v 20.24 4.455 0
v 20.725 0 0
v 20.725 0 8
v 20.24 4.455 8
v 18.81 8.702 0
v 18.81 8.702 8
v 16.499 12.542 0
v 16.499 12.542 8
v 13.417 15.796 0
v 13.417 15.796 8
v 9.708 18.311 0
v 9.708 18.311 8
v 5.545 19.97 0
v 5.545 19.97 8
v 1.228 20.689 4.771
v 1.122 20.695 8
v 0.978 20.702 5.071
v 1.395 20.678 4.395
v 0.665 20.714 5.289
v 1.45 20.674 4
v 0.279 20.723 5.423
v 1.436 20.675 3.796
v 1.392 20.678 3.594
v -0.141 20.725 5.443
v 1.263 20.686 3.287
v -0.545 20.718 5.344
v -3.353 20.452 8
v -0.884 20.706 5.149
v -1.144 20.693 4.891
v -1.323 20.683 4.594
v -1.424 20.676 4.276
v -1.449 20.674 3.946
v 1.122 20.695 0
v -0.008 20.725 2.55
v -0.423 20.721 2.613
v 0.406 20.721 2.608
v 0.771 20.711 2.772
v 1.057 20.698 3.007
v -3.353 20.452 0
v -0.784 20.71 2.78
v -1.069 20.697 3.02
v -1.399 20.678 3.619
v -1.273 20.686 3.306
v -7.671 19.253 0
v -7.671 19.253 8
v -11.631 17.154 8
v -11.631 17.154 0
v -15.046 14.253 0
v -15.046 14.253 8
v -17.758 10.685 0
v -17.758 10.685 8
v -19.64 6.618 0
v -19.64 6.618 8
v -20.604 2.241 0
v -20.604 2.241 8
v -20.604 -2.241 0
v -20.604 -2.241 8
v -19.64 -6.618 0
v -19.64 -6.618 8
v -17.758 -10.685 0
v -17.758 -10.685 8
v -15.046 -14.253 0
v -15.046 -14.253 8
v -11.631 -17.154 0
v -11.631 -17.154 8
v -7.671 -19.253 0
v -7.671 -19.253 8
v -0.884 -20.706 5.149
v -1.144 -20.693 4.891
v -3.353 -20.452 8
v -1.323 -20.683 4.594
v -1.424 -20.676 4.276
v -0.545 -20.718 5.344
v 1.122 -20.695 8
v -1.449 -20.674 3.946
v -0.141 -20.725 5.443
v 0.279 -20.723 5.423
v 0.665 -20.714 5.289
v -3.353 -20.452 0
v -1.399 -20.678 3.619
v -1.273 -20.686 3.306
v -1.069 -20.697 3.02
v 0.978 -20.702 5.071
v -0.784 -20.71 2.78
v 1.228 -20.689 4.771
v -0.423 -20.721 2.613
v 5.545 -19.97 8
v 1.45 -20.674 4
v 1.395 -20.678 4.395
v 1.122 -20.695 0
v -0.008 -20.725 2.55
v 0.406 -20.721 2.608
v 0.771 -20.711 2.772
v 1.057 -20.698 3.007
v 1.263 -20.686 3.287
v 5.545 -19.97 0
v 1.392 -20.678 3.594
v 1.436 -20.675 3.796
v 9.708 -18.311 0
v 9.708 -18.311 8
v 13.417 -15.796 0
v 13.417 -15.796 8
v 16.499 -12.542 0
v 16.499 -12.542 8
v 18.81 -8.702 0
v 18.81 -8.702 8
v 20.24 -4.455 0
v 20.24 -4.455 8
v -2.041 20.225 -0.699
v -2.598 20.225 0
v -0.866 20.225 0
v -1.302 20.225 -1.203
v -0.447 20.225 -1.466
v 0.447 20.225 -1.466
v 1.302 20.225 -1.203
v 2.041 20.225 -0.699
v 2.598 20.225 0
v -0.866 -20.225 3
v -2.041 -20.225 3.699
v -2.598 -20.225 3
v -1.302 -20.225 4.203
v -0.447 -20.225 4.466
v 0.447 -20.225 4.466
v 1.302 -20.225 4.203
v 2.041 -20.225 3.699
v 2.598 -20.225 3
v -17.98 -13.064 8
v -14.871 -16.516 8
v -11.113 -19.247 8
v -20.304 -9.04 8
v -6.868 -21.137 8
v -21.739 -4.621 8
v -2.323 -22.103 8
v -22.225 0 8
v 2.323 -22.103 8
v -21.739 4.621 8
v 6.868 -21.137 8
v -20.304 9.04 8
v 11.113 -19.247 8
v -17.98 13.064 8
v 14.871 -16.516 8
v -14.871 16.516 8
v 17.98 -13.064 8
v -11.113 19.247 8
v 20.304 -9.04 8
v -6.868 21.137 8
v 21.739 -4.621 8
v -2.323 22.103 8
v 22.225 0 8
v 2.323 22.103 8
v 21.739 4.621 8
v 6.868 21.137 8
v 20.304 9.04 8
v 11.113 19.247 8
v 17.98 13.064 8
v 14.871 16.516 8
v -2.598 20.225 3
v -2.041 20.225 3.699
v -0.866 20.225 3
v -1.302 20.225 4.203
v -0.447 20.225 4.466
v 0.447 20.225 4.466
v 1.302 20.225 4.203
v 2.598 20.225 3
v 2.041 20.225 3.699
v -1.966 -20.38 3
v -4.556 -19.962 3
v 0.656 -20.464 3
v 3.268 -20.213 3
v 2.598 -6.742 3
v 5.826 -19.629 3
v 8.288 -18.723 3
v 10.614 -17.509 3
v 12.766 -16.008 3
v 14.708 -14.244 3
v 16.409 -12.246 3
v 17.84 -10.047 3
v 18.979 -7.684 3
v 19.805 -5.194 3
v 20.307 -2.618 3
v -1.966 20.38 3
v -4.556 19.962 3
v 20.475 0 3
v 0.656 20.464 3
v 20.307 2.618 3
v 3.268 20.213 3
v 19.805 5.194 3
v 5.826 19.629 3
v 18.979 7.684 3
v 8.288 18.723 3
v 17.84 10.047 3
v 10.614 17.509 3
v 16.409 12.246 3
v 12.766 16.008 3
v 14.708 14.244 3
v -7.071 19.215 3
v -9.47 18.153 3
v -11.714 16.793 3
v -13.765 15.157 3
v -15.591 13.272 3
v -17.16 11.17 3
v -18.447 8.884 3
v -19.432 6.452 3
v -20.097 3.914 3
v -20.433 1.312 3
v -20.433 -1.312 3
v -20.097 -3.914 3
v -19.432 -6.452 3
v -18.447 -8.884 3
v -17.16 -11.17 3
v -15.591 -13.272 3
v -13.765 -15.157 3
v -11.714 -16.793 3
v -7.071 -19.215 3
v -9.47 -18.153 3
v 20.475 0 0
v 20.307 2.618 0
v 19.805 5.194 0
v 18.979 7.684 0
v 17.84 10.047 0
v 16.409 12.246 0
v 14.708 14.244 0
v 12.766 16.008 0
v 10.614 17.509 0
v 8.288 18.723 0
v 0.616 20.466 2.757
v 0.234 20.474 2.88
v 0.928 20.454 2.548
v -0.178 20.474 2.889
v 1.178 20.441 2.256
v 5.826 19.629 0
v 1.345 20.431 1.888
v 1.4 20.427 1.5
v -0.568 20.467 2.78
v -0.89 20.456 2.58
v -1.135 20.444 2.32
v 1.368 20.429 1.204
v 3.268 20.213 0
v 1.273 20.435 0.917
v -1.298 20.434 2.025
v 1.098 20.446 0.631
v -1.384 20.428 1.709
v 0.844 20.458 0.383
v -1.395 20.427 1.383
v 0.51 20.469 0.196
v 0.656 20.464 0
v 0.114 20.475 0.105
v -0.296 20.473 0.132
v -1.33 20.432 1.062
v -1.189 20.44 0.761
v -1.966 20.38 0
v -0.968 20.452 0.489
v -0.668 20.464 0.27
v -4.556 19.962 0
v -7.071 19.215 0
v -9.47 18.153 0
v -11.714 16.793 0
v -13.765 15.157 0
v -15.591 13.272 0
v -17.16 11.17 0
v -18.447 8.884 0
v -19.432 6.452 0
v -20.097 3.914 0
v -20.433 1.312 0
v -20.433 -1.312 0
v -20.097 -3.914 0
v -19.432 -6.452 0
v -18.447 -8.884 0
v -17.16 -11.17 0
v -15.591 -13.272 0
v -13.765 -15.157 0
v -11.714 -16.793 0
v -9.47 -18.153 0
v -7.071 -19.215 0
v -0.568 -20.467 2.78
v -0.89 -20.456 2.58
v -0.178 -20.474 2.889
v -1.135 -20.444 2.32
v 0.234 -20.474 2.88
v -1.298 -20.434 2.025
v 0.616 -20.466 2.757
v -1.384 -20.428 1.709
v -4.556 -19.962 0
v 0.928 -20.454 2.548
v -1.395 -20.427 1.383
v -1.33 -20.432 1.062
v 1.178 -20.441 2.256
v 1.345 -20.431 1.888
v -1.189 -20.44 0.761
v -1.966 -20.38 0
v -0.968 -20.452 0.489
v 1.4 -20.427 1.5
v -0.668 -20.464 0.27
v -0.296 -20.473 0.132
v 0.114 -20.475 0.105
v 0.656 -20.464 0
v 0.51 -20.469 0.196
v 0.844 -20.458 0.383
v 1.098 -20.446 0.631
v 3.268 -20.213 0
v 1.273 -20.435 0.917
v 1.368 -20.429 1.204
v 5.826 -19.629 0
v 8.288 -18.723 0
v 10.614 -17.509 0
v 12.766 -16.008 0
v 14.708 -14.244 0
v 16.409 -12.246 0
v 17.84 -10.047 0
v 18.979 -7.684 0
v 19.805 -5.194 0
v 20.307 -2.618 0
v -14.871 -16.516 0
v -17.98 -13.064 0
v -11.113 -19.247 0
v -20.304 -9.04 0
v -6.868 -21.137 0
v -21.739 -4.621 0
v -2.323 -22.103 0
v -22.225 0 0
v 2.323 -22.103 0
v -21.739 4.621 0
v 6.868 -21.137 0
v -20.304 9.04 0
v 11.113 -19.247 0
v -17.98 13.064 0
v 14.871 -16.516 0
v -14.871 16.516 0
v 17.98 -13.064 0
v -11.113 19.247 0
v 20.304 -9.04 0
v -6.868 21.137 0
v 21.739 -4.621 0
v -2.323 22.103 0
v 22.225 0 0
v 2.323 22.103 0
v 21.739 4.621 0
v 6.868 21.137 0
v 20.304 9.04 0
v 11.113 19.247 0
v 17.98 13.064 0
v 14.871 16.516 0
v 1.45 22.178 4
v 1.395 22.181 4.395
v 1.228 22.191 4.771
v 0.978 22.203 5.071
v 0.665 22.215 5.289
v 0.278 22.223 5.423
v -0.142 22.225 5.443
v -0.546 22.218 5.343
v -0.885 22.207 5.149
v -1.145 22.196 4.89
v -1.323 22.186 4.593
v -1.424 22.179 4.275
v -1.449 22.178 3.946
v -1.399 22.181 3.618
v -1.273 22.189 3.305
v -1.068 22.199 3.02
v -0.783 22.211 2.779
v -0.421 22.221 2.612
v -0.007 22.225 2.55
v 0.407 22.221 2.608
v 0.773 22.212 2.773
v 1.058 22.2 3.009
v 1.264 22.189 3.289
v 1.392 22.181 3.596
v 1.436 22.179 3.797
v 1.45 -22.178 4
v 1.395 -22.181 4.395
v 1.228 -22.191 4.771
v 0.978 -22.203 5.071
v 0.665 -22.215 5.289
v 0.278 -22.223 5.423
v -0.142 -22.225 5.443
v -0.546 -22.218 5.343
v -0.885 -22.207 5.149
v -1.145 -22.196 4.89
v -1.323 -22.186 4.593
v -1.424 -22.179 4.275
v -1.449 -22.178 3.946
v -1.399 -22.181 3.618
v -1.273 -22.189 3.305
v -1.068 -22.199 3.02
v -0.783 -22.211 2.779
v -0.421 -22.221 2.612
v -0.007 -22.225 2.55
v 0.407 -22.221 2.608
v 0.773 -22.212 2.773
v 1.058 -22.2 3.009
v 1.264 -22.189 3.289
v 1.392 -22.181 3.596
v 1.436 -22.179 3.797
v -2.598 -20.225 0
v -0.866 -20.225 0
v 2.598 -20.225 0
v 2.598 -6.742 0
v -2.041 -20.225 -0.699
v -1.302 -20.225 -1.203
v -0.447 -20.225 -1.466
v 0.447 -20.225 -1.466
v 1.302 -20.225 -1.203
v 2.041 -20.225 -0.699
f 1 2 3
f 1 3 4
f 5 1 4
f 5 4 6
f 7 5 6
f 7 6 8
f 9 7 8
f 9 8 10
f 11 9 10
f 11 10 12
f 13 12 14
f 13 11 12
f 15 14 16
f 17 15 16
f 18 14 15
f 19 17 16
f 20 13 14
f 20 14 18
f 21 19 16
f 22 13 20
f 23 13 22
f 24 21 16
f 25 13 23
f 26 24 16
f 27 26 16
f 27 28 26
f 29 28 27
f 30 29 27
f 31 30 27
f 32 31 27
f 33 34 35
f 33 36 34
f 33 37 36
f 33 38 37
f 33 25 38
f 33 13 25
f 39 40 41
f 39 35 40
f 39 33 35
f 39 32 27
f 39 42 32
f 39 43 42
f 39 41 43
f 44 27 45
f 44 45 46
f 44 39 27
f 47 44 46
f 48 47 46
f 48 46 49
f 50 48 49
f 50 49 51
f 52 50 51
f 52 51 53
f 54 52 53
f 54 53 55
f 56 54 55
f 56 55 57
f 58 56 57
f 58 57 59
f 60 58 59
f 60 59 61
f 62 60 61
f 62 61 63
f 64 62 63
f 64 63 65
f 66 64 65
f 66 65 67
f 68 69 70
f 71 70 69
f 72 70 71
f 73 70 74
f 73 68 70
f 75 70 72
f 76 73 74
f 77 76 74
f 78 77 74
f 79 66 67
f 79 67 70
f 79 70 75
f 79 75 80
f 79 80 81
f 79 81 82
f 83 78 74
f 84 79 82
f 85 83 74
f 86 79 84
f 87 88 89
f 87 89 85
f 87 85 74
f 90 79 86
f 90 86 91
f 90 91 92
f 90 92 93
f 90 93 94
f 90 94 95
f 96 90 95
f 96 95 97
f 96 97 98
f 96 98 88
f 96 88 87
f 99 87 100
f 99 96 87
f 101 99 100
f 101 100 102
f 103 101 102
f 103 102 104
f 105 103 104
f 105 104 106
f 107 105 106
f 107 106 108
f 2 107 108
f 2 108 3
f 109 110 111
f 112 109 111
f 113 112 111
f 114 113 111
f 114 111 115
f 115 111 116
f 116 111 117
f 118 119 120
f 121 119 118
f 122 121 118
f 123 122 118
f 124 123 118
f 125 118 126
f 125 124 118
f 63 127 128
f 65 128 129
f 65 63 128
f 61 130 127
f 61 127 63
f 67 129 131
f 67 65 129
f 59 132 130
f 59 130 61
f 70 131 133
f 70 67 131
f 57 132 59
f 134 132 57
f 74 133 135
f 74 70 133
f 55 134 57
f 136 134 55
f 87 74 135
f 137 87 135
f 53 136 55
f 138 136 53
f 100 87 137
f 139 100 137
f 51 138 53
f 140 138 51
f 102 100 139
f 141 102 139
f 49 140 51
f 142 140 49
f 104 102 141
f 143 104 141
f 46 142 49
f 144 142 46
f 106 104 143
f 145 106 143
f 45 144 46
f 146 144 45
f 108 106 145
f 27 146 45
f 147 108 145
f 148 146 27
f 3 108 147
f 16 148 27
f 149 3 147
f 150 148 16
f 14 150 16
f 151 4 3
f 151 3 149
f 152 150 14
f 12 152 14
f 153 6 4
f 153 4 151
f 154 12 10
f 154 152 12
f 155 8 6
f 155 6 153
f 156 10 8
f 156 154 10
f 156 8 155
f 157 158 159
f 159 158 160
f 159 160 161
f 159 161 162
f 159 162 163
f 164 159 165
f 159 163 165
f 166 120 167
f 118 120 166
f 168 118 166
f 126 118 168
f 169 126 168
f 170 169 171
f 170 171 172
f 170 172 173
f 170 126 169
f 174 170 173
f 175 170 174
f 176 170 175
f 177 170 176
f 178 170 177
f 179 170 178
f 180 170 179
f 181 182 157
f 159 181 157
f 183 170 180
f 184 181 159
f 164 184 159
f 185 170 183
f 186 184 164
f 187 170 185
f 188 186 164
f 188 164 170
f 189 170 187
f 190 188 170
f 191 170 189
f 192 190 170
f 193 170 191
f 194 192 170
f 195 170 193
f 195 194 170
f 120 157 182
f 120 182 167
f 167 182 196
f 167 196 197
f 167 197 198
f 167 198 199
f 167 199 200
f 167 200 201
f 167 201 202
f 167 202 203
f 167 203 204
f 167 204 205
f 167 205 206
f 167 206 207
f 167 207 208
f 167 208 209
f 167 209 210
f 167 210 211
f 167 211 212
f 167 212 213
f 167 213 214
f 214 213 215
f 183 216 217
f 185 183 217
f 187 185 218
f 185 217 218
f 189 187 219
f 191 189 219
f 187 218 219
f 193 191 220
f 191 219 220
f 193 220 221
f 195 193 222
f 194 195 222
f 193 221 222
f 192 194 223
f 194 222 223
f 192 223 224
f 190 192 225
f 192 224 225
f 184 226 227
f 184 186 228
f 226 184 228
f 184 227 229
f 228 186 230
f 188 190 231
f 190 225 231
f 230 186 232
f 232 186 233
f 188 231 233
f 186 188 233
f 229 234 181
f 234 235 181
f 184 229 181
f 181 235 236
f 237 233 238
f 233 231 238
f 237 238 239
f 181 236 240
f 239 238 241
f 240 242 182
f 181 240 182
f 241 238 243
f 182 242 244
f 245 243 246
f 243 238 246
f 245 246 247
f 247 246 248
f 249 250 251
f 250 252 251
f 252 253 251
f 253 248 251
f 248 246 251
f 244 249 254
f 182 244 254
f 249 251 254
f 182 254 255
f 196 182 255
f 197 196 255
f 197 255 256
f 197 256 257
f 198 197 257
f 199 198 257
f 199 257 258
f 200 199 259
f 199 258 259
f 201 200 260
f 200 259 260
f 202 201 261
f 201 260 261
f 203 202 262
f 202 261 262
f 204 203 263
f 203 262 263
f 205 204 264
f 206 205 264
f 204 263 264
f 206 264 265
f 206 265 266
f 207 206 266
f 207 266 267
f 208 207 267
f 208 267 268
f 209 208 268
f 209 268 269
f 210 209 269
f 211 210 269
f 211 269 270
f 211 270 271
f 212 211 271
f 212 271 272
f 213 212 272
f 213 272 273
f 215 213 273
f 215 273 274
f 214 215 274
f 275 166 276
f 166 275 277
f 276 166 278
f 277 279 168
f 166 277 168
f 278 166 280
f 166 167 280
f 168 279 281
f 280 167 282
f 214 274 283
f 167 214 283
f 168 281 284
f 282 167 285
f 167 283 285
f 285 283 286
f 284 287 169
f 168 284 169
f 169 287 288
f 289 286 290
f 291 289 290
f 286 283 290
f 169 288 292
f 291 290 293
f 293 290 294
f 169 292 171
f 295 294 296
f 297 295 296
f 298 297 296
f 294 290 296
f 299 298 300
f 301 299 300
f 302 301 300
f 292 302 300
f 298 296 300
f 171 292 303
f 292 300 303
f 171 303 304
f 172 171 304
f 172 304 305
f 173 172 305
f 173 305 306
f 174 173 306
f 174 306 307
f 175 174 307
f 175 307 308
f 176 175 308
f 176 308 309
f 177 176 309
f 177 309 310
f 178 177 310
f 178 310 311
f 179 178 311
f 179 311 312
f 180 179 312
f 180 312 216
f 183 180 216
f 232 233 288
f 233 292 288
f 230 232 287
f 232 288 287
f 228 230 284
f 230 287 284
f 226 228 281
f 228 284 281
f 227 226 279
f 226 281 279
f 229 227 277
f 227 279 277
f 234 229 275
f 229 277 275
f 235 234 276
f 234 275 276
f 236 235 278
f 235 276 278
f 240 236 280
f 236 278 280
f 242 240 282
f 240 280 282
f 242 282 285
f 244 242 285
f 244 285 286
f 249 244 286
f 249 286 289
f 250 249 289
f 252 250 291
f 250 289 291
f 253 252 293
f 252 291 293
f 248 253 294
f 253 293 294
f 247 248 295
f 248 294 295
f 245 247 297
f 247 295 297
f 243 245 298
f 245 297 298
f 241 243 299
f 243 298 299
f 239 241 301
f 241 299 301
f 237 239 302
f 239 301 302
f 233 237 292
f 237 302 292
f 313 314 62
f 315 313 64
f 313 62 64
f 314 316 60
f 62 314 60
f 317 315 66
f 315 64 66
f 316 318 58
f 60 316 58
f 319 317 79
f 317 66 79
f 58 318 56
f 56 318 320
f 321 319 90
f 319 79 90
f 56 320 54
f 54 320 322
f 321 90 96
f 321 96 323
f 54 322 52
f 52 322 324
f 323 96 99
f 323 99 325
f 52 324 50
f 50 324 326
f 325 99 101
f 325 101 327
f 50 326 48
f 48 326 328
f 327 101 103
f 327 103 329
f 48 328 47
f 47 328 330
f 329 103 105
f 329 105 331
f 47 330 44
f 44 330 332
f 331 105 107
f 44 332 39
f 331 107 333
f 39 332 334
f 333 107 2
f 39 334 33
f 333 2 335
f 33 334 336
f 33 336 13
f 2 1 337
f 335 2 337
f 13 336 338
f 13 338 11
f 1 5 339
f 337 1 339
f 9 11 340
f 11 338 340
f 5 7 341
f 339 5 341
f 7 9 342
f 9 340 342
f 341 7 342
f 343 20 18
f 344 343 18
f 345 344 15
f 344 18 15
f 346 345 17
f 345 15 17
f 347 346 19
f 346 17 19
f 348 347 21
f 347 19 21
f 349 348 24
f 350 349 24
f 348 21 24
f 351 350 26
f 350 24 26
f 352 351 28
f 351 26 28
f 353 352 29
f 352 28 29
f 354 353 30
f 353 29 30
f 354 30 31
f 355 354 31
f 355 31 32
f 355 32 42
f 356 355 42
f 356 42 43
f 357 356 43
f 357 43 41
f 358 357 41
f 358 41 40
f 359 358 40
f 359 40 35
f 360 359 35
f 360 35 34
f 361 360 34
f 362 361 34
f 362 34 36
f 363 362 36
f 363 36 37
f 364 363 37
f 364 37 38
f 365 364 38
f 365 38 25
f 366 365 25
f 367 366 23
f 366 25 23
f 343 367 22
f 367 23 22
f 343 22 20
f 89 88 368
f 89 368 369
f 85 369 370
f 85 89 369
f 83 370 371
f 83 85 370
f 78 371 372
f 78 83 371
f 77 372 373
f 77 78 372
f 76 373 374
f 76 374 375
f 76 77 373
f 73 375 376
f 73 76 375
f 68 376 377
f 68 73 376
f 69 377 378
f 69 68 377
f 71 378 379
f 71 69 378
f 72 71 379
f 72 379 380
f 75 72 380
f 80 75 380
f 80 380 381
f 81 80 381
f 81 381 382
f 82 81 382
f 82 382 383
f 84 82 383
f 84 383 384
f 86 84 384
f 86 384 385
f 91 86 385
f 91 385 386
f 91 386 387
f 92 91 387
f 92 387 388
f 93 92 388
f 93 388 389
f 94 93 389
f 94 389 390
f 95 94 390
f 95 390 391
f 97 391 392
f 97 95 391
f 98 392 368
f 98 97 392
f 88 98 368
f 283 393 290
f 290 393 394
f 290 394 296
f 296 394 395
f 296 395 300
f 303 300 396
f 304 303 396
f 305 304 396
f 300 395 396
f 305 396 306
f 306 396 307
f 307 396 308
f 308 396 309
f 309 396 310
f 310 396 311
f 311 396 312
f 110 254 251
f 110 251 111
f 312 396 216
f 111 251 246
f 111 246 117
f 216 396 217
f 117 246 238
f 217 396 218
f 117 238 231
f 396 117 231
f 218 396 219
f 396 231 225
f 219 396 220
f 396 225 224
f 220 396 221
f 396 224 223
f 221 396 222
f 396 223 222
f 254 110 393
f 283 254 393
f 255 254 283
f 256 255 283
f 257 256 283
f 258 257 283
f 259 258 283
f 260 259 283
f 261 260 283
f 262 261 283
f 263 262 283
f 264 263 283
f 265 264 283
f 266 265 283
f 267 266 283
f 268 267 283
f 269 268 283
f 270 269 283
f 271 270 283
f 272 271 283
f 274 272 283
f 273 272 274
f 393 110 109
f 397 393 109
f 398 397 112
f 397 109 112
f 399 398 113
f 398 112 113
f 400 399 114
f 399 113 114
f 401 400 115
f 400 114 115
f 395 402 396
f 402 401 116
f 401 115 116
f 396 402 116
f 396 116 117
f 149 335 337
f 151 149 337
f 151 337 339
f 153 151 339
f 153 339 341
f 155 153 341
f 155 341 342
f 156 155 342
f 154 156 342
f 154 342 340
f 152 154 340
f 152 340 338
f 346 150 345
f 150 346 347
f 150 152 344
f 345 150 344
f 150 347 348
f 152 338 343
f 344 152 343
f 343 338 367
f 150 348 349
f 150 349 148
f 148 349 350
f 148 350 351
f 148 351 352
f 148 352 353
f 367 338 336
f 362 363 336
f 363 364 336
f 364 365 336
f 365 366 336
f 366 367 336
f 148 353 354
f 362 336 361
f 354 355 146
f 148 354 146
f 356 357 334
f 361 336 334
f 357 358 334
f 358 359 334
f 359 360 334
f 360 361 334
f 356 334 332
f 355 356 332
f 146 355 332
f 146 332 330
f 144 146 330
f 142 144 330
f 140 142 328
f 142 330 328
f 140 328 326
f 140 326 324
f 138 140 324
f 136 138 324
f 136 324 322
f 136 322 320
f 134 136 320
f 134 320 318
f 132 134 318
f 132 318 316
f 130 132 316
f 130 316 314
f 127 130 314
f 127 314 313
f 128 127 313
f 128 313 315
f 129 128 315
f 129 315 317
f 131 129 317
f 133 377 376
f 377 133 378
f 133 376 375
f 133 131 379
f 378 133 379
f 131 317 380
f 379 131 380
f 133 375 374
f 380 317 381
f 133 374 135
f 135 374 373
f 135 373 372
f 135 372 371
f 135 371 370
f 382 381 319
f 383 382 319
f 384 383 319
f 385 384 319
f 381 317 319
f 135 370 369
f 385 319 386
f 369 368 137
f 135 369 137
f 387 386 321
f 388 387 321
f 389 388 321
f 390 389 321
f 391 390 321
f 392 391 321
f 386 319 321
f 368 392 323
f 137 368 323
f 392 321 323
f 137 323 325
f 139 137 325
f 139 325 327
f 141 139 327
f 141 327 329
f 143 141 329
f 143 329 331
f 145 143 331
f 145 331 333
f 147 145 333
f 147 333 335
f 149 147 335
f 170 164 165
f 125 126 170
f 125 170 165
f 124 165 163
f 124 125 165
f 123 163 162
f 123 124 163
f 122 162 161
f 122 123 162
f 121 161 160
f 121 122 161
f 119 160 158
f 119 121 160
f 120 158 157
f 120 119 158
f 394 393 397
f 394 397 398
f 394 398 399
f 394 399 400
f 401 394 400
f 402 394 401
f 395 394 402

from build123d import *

# Parameters (mm, degrees)
F0_R          = 22.225
F0_R_2        = 20.725
F1_DEPTH      = 8
F0_R_3        = 20.475
F2_DEPTH      = 3
F3_R          = 3
F4_DEPTH      = 20.225
F4_DEPTH_BACK = 20.225
F5_R          = 1.45
F6_DEPTH      = 22.226
F6_DEPTH_BACK = 22.226
F7_R          = 1.4
F8_DEPTH      = 22.2260001181
F8_DEPTH_BACK = 22.2260001181


with BuildPart() as f1:
    # F0 (on Top) → F1 (new body)
    with BuildSketch(Plane.XY):
        Circle(F0_R)
        Circle(F0_R_2, mode=Mode.SUBTRACT)
    extrude(amount=F1_DEPTH)

    # F5 (on Front) → F6 (cut, two sides)
    with BuildSketch(Plane.XZ) as f6_sk:
        with Locations((0, 4)):
            Circle(F5_R)
    extrude(amount=-F6_DEPTH, mode=Mode.SUBTRACT)
    extrude(f6_sk.sketch, amount=F6_DEPTH_BACK, mode=Mode.SUBTRACT)


with BuildPart() as f2:
    # F0 (on Top) → F2 (new body)
    with BuildSketch(Plane.XY):
        Circle(F0_R_3)
    extrude(amount=F2_DEPTH)

    # F3 (on Front) → F4 (join, two sides)
    with BuildSketch(Plane.XZ) as f4_sk:
        with Locations((0, 1.5)):
            Circle(F3_R)
    extrude(amount=F4_DEPTH)
    extrude(f4_sk.sketch, amount=-F4_DEPTH_BACK)

    # F7 (on Front) → F8 (cut, two sides)
    with BuildSketch(Plane.XZ) as f8_sk:
        with Locations((0, 1.5)):
            Circle(F7_R)
    extrude(amount=-F8_DEPTH, mode=Mode.SUBTRACT)
    extrude(f8_sk.sketch, amount=F8_DEPTH_BACK, mode=Mode.SUBTRACT)


solid = Compound([f1.part, f2.part])
